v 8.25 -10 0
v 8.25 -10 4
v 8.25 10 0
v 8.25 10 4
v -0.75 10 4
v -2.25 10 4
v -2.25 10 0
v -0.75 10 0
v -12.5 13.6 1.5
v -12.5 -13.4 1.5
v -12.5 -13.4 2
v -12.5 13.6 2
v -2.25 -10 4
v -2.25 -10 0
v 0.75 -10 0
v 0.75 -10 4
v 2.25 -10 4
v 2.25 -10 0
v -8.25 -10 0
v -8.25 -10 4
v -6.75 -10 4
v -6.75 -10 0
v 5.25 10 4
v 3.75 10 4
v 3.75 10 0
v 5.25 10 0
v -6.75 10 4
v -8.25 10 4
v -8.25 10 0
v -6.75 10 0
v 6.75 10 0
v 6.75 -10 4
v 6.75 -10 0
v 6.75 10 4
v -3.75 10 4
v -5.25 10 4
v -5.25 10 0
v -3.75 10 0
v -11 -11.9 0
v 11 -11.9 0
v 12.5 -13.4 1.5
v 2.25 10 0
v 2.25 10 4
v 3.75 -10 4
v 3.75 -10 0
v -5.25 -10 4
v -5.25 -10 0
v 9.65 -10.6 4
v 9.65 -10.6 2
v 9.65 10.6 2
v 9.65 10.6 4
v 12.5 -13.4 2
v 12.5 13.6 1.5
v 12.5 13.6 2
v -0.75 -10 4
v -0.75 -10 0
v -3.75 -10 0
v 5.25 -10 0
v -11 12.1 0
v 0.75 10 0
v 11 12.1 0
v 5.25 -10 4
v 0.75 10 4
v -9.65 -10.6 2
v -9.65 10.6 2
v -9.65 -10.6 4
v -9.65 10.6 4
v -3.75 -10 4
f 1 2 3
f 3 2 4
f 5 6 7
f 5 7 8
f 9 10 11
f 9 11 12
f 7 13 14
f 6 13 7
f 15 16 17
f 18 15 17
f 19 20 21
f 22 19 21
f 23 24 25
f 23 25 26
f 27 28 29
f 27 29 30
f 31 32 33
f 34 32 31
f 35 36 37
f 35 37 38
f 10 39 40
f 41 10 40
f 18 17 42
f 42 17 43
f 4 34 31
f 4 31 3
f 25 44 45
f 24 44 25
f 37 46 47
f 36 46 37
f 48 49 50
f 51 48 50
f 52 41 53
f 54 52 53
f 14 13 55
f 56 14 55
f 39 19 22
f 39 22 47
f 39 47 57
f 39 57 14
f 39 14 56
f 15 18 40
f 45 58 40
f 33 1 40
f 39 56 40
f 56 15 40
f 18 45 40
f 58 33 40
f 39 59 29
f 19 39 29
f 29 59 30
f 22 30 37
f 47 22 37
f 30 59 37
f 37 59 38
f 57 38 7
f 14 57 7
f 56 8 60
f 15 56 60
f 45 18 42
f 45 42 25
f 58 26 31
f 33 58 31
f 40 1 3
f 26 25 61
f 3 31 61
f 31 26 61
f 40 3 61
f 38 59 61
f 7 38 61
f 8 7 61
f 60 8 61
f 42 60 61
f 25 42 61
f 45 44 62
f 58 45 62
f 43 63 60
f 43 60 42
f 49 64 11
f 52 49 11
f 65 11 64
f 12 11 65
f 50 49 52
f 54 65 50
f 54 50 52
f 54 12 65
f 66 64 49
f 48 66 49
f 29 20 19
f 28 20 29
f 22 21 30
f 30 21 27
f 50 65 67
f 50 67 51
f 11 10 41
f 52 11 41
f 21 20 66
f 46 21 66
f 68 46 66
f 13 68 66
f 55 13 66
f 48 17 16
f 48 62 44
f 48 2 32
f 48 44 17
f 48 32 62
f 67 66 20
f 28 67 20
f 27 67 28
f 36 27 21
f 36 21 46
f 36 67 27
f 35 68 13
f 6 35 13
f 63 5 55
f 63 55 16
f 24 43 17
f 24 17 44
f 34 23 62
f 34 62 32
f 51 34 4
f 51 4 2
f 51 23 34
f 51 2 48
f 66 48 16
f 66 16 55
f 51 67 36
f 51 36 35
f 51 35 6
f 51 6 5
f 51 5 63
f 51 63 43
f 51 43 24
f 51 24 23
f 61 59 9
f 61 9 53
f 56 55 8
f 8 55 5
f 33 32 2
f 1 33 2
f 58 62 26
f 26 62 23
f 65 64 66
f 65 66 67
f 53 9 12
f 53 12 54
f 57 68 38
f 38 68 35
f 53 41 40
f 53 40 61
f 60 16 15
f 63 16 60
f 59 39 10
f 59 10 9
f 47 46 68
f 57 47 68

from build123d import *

# Parameters (mm, degrees)
SKETCH_W     = 25
SKETCH_H     = 27
PAD_DEPTH    = 2
SKETCH001_W  = 19.3
SKETCH001_H  = 21.2
PAD001_DEPTH = 2
SKETCH002_W  = 1.5
SKETCH002_H  = 20
POCKET_DEPTH = 5
CHAMFER_SIZE = 1.5


with BuildPart() as part:
    # Sketch → Pad (new body)
    with BuildSketch(Plane.XY):
        with Locations((0, 0.1)):
            Rectangle(SKETCH_W, SKETCH_H)
    extrude(amount=PAD_DEPTH)

    # Sketch001 (on Face6 of Pad) → Pad001 (join)
    with BuildSketch(Plane.XY.offset(2)):
        Rectangle(SKETCH001_W, SKETCH001_H)
    extrude(amount=PAD001_DEPTH)

    # Sketch002 (on Face11 of Pad001) → Pocket (cut)
    with BuildSketch(Plane.XY.offset(4)):
        with Locations((1.5, 0)):
            Rectangle(SKETCH002_W, SKETCH002_H)
        with Locations((4.5, 0)):
            Rectangle(SKETCH002_W, SKETCH002_H)
        with Locations((7.5, 0)):
            Rectangle(SKETCH002_W, SKETCH002_H)
        with Locations((-1.5, 0)):
            Rectangle(SKETCH002_W, SKETCH002_H)
        with Locations((-4.5, 0)):
            Rectangle(SKETCH002_W, SKETCH002_H)
        with Locations((-7.5, 0)):
            Rectangle(SKETCH002_W, SKETCH002_H)
    extrude(amount=-POCKET_DEPTH, mode=Mode.SUBTRACT)

    # Chamfer
    chamfer_edges = [part.edges().sort_by_distance(p)[0] for p in [
        (0, 13.6, 0),
        (12.5, 0.1, 0),
        (-12.5, 0.1, 0),
        (0, -13.4, 0),
    ]]
    chamfer(chamfer_edges, length=CHAMFER_SIZE)


solid = part.part
